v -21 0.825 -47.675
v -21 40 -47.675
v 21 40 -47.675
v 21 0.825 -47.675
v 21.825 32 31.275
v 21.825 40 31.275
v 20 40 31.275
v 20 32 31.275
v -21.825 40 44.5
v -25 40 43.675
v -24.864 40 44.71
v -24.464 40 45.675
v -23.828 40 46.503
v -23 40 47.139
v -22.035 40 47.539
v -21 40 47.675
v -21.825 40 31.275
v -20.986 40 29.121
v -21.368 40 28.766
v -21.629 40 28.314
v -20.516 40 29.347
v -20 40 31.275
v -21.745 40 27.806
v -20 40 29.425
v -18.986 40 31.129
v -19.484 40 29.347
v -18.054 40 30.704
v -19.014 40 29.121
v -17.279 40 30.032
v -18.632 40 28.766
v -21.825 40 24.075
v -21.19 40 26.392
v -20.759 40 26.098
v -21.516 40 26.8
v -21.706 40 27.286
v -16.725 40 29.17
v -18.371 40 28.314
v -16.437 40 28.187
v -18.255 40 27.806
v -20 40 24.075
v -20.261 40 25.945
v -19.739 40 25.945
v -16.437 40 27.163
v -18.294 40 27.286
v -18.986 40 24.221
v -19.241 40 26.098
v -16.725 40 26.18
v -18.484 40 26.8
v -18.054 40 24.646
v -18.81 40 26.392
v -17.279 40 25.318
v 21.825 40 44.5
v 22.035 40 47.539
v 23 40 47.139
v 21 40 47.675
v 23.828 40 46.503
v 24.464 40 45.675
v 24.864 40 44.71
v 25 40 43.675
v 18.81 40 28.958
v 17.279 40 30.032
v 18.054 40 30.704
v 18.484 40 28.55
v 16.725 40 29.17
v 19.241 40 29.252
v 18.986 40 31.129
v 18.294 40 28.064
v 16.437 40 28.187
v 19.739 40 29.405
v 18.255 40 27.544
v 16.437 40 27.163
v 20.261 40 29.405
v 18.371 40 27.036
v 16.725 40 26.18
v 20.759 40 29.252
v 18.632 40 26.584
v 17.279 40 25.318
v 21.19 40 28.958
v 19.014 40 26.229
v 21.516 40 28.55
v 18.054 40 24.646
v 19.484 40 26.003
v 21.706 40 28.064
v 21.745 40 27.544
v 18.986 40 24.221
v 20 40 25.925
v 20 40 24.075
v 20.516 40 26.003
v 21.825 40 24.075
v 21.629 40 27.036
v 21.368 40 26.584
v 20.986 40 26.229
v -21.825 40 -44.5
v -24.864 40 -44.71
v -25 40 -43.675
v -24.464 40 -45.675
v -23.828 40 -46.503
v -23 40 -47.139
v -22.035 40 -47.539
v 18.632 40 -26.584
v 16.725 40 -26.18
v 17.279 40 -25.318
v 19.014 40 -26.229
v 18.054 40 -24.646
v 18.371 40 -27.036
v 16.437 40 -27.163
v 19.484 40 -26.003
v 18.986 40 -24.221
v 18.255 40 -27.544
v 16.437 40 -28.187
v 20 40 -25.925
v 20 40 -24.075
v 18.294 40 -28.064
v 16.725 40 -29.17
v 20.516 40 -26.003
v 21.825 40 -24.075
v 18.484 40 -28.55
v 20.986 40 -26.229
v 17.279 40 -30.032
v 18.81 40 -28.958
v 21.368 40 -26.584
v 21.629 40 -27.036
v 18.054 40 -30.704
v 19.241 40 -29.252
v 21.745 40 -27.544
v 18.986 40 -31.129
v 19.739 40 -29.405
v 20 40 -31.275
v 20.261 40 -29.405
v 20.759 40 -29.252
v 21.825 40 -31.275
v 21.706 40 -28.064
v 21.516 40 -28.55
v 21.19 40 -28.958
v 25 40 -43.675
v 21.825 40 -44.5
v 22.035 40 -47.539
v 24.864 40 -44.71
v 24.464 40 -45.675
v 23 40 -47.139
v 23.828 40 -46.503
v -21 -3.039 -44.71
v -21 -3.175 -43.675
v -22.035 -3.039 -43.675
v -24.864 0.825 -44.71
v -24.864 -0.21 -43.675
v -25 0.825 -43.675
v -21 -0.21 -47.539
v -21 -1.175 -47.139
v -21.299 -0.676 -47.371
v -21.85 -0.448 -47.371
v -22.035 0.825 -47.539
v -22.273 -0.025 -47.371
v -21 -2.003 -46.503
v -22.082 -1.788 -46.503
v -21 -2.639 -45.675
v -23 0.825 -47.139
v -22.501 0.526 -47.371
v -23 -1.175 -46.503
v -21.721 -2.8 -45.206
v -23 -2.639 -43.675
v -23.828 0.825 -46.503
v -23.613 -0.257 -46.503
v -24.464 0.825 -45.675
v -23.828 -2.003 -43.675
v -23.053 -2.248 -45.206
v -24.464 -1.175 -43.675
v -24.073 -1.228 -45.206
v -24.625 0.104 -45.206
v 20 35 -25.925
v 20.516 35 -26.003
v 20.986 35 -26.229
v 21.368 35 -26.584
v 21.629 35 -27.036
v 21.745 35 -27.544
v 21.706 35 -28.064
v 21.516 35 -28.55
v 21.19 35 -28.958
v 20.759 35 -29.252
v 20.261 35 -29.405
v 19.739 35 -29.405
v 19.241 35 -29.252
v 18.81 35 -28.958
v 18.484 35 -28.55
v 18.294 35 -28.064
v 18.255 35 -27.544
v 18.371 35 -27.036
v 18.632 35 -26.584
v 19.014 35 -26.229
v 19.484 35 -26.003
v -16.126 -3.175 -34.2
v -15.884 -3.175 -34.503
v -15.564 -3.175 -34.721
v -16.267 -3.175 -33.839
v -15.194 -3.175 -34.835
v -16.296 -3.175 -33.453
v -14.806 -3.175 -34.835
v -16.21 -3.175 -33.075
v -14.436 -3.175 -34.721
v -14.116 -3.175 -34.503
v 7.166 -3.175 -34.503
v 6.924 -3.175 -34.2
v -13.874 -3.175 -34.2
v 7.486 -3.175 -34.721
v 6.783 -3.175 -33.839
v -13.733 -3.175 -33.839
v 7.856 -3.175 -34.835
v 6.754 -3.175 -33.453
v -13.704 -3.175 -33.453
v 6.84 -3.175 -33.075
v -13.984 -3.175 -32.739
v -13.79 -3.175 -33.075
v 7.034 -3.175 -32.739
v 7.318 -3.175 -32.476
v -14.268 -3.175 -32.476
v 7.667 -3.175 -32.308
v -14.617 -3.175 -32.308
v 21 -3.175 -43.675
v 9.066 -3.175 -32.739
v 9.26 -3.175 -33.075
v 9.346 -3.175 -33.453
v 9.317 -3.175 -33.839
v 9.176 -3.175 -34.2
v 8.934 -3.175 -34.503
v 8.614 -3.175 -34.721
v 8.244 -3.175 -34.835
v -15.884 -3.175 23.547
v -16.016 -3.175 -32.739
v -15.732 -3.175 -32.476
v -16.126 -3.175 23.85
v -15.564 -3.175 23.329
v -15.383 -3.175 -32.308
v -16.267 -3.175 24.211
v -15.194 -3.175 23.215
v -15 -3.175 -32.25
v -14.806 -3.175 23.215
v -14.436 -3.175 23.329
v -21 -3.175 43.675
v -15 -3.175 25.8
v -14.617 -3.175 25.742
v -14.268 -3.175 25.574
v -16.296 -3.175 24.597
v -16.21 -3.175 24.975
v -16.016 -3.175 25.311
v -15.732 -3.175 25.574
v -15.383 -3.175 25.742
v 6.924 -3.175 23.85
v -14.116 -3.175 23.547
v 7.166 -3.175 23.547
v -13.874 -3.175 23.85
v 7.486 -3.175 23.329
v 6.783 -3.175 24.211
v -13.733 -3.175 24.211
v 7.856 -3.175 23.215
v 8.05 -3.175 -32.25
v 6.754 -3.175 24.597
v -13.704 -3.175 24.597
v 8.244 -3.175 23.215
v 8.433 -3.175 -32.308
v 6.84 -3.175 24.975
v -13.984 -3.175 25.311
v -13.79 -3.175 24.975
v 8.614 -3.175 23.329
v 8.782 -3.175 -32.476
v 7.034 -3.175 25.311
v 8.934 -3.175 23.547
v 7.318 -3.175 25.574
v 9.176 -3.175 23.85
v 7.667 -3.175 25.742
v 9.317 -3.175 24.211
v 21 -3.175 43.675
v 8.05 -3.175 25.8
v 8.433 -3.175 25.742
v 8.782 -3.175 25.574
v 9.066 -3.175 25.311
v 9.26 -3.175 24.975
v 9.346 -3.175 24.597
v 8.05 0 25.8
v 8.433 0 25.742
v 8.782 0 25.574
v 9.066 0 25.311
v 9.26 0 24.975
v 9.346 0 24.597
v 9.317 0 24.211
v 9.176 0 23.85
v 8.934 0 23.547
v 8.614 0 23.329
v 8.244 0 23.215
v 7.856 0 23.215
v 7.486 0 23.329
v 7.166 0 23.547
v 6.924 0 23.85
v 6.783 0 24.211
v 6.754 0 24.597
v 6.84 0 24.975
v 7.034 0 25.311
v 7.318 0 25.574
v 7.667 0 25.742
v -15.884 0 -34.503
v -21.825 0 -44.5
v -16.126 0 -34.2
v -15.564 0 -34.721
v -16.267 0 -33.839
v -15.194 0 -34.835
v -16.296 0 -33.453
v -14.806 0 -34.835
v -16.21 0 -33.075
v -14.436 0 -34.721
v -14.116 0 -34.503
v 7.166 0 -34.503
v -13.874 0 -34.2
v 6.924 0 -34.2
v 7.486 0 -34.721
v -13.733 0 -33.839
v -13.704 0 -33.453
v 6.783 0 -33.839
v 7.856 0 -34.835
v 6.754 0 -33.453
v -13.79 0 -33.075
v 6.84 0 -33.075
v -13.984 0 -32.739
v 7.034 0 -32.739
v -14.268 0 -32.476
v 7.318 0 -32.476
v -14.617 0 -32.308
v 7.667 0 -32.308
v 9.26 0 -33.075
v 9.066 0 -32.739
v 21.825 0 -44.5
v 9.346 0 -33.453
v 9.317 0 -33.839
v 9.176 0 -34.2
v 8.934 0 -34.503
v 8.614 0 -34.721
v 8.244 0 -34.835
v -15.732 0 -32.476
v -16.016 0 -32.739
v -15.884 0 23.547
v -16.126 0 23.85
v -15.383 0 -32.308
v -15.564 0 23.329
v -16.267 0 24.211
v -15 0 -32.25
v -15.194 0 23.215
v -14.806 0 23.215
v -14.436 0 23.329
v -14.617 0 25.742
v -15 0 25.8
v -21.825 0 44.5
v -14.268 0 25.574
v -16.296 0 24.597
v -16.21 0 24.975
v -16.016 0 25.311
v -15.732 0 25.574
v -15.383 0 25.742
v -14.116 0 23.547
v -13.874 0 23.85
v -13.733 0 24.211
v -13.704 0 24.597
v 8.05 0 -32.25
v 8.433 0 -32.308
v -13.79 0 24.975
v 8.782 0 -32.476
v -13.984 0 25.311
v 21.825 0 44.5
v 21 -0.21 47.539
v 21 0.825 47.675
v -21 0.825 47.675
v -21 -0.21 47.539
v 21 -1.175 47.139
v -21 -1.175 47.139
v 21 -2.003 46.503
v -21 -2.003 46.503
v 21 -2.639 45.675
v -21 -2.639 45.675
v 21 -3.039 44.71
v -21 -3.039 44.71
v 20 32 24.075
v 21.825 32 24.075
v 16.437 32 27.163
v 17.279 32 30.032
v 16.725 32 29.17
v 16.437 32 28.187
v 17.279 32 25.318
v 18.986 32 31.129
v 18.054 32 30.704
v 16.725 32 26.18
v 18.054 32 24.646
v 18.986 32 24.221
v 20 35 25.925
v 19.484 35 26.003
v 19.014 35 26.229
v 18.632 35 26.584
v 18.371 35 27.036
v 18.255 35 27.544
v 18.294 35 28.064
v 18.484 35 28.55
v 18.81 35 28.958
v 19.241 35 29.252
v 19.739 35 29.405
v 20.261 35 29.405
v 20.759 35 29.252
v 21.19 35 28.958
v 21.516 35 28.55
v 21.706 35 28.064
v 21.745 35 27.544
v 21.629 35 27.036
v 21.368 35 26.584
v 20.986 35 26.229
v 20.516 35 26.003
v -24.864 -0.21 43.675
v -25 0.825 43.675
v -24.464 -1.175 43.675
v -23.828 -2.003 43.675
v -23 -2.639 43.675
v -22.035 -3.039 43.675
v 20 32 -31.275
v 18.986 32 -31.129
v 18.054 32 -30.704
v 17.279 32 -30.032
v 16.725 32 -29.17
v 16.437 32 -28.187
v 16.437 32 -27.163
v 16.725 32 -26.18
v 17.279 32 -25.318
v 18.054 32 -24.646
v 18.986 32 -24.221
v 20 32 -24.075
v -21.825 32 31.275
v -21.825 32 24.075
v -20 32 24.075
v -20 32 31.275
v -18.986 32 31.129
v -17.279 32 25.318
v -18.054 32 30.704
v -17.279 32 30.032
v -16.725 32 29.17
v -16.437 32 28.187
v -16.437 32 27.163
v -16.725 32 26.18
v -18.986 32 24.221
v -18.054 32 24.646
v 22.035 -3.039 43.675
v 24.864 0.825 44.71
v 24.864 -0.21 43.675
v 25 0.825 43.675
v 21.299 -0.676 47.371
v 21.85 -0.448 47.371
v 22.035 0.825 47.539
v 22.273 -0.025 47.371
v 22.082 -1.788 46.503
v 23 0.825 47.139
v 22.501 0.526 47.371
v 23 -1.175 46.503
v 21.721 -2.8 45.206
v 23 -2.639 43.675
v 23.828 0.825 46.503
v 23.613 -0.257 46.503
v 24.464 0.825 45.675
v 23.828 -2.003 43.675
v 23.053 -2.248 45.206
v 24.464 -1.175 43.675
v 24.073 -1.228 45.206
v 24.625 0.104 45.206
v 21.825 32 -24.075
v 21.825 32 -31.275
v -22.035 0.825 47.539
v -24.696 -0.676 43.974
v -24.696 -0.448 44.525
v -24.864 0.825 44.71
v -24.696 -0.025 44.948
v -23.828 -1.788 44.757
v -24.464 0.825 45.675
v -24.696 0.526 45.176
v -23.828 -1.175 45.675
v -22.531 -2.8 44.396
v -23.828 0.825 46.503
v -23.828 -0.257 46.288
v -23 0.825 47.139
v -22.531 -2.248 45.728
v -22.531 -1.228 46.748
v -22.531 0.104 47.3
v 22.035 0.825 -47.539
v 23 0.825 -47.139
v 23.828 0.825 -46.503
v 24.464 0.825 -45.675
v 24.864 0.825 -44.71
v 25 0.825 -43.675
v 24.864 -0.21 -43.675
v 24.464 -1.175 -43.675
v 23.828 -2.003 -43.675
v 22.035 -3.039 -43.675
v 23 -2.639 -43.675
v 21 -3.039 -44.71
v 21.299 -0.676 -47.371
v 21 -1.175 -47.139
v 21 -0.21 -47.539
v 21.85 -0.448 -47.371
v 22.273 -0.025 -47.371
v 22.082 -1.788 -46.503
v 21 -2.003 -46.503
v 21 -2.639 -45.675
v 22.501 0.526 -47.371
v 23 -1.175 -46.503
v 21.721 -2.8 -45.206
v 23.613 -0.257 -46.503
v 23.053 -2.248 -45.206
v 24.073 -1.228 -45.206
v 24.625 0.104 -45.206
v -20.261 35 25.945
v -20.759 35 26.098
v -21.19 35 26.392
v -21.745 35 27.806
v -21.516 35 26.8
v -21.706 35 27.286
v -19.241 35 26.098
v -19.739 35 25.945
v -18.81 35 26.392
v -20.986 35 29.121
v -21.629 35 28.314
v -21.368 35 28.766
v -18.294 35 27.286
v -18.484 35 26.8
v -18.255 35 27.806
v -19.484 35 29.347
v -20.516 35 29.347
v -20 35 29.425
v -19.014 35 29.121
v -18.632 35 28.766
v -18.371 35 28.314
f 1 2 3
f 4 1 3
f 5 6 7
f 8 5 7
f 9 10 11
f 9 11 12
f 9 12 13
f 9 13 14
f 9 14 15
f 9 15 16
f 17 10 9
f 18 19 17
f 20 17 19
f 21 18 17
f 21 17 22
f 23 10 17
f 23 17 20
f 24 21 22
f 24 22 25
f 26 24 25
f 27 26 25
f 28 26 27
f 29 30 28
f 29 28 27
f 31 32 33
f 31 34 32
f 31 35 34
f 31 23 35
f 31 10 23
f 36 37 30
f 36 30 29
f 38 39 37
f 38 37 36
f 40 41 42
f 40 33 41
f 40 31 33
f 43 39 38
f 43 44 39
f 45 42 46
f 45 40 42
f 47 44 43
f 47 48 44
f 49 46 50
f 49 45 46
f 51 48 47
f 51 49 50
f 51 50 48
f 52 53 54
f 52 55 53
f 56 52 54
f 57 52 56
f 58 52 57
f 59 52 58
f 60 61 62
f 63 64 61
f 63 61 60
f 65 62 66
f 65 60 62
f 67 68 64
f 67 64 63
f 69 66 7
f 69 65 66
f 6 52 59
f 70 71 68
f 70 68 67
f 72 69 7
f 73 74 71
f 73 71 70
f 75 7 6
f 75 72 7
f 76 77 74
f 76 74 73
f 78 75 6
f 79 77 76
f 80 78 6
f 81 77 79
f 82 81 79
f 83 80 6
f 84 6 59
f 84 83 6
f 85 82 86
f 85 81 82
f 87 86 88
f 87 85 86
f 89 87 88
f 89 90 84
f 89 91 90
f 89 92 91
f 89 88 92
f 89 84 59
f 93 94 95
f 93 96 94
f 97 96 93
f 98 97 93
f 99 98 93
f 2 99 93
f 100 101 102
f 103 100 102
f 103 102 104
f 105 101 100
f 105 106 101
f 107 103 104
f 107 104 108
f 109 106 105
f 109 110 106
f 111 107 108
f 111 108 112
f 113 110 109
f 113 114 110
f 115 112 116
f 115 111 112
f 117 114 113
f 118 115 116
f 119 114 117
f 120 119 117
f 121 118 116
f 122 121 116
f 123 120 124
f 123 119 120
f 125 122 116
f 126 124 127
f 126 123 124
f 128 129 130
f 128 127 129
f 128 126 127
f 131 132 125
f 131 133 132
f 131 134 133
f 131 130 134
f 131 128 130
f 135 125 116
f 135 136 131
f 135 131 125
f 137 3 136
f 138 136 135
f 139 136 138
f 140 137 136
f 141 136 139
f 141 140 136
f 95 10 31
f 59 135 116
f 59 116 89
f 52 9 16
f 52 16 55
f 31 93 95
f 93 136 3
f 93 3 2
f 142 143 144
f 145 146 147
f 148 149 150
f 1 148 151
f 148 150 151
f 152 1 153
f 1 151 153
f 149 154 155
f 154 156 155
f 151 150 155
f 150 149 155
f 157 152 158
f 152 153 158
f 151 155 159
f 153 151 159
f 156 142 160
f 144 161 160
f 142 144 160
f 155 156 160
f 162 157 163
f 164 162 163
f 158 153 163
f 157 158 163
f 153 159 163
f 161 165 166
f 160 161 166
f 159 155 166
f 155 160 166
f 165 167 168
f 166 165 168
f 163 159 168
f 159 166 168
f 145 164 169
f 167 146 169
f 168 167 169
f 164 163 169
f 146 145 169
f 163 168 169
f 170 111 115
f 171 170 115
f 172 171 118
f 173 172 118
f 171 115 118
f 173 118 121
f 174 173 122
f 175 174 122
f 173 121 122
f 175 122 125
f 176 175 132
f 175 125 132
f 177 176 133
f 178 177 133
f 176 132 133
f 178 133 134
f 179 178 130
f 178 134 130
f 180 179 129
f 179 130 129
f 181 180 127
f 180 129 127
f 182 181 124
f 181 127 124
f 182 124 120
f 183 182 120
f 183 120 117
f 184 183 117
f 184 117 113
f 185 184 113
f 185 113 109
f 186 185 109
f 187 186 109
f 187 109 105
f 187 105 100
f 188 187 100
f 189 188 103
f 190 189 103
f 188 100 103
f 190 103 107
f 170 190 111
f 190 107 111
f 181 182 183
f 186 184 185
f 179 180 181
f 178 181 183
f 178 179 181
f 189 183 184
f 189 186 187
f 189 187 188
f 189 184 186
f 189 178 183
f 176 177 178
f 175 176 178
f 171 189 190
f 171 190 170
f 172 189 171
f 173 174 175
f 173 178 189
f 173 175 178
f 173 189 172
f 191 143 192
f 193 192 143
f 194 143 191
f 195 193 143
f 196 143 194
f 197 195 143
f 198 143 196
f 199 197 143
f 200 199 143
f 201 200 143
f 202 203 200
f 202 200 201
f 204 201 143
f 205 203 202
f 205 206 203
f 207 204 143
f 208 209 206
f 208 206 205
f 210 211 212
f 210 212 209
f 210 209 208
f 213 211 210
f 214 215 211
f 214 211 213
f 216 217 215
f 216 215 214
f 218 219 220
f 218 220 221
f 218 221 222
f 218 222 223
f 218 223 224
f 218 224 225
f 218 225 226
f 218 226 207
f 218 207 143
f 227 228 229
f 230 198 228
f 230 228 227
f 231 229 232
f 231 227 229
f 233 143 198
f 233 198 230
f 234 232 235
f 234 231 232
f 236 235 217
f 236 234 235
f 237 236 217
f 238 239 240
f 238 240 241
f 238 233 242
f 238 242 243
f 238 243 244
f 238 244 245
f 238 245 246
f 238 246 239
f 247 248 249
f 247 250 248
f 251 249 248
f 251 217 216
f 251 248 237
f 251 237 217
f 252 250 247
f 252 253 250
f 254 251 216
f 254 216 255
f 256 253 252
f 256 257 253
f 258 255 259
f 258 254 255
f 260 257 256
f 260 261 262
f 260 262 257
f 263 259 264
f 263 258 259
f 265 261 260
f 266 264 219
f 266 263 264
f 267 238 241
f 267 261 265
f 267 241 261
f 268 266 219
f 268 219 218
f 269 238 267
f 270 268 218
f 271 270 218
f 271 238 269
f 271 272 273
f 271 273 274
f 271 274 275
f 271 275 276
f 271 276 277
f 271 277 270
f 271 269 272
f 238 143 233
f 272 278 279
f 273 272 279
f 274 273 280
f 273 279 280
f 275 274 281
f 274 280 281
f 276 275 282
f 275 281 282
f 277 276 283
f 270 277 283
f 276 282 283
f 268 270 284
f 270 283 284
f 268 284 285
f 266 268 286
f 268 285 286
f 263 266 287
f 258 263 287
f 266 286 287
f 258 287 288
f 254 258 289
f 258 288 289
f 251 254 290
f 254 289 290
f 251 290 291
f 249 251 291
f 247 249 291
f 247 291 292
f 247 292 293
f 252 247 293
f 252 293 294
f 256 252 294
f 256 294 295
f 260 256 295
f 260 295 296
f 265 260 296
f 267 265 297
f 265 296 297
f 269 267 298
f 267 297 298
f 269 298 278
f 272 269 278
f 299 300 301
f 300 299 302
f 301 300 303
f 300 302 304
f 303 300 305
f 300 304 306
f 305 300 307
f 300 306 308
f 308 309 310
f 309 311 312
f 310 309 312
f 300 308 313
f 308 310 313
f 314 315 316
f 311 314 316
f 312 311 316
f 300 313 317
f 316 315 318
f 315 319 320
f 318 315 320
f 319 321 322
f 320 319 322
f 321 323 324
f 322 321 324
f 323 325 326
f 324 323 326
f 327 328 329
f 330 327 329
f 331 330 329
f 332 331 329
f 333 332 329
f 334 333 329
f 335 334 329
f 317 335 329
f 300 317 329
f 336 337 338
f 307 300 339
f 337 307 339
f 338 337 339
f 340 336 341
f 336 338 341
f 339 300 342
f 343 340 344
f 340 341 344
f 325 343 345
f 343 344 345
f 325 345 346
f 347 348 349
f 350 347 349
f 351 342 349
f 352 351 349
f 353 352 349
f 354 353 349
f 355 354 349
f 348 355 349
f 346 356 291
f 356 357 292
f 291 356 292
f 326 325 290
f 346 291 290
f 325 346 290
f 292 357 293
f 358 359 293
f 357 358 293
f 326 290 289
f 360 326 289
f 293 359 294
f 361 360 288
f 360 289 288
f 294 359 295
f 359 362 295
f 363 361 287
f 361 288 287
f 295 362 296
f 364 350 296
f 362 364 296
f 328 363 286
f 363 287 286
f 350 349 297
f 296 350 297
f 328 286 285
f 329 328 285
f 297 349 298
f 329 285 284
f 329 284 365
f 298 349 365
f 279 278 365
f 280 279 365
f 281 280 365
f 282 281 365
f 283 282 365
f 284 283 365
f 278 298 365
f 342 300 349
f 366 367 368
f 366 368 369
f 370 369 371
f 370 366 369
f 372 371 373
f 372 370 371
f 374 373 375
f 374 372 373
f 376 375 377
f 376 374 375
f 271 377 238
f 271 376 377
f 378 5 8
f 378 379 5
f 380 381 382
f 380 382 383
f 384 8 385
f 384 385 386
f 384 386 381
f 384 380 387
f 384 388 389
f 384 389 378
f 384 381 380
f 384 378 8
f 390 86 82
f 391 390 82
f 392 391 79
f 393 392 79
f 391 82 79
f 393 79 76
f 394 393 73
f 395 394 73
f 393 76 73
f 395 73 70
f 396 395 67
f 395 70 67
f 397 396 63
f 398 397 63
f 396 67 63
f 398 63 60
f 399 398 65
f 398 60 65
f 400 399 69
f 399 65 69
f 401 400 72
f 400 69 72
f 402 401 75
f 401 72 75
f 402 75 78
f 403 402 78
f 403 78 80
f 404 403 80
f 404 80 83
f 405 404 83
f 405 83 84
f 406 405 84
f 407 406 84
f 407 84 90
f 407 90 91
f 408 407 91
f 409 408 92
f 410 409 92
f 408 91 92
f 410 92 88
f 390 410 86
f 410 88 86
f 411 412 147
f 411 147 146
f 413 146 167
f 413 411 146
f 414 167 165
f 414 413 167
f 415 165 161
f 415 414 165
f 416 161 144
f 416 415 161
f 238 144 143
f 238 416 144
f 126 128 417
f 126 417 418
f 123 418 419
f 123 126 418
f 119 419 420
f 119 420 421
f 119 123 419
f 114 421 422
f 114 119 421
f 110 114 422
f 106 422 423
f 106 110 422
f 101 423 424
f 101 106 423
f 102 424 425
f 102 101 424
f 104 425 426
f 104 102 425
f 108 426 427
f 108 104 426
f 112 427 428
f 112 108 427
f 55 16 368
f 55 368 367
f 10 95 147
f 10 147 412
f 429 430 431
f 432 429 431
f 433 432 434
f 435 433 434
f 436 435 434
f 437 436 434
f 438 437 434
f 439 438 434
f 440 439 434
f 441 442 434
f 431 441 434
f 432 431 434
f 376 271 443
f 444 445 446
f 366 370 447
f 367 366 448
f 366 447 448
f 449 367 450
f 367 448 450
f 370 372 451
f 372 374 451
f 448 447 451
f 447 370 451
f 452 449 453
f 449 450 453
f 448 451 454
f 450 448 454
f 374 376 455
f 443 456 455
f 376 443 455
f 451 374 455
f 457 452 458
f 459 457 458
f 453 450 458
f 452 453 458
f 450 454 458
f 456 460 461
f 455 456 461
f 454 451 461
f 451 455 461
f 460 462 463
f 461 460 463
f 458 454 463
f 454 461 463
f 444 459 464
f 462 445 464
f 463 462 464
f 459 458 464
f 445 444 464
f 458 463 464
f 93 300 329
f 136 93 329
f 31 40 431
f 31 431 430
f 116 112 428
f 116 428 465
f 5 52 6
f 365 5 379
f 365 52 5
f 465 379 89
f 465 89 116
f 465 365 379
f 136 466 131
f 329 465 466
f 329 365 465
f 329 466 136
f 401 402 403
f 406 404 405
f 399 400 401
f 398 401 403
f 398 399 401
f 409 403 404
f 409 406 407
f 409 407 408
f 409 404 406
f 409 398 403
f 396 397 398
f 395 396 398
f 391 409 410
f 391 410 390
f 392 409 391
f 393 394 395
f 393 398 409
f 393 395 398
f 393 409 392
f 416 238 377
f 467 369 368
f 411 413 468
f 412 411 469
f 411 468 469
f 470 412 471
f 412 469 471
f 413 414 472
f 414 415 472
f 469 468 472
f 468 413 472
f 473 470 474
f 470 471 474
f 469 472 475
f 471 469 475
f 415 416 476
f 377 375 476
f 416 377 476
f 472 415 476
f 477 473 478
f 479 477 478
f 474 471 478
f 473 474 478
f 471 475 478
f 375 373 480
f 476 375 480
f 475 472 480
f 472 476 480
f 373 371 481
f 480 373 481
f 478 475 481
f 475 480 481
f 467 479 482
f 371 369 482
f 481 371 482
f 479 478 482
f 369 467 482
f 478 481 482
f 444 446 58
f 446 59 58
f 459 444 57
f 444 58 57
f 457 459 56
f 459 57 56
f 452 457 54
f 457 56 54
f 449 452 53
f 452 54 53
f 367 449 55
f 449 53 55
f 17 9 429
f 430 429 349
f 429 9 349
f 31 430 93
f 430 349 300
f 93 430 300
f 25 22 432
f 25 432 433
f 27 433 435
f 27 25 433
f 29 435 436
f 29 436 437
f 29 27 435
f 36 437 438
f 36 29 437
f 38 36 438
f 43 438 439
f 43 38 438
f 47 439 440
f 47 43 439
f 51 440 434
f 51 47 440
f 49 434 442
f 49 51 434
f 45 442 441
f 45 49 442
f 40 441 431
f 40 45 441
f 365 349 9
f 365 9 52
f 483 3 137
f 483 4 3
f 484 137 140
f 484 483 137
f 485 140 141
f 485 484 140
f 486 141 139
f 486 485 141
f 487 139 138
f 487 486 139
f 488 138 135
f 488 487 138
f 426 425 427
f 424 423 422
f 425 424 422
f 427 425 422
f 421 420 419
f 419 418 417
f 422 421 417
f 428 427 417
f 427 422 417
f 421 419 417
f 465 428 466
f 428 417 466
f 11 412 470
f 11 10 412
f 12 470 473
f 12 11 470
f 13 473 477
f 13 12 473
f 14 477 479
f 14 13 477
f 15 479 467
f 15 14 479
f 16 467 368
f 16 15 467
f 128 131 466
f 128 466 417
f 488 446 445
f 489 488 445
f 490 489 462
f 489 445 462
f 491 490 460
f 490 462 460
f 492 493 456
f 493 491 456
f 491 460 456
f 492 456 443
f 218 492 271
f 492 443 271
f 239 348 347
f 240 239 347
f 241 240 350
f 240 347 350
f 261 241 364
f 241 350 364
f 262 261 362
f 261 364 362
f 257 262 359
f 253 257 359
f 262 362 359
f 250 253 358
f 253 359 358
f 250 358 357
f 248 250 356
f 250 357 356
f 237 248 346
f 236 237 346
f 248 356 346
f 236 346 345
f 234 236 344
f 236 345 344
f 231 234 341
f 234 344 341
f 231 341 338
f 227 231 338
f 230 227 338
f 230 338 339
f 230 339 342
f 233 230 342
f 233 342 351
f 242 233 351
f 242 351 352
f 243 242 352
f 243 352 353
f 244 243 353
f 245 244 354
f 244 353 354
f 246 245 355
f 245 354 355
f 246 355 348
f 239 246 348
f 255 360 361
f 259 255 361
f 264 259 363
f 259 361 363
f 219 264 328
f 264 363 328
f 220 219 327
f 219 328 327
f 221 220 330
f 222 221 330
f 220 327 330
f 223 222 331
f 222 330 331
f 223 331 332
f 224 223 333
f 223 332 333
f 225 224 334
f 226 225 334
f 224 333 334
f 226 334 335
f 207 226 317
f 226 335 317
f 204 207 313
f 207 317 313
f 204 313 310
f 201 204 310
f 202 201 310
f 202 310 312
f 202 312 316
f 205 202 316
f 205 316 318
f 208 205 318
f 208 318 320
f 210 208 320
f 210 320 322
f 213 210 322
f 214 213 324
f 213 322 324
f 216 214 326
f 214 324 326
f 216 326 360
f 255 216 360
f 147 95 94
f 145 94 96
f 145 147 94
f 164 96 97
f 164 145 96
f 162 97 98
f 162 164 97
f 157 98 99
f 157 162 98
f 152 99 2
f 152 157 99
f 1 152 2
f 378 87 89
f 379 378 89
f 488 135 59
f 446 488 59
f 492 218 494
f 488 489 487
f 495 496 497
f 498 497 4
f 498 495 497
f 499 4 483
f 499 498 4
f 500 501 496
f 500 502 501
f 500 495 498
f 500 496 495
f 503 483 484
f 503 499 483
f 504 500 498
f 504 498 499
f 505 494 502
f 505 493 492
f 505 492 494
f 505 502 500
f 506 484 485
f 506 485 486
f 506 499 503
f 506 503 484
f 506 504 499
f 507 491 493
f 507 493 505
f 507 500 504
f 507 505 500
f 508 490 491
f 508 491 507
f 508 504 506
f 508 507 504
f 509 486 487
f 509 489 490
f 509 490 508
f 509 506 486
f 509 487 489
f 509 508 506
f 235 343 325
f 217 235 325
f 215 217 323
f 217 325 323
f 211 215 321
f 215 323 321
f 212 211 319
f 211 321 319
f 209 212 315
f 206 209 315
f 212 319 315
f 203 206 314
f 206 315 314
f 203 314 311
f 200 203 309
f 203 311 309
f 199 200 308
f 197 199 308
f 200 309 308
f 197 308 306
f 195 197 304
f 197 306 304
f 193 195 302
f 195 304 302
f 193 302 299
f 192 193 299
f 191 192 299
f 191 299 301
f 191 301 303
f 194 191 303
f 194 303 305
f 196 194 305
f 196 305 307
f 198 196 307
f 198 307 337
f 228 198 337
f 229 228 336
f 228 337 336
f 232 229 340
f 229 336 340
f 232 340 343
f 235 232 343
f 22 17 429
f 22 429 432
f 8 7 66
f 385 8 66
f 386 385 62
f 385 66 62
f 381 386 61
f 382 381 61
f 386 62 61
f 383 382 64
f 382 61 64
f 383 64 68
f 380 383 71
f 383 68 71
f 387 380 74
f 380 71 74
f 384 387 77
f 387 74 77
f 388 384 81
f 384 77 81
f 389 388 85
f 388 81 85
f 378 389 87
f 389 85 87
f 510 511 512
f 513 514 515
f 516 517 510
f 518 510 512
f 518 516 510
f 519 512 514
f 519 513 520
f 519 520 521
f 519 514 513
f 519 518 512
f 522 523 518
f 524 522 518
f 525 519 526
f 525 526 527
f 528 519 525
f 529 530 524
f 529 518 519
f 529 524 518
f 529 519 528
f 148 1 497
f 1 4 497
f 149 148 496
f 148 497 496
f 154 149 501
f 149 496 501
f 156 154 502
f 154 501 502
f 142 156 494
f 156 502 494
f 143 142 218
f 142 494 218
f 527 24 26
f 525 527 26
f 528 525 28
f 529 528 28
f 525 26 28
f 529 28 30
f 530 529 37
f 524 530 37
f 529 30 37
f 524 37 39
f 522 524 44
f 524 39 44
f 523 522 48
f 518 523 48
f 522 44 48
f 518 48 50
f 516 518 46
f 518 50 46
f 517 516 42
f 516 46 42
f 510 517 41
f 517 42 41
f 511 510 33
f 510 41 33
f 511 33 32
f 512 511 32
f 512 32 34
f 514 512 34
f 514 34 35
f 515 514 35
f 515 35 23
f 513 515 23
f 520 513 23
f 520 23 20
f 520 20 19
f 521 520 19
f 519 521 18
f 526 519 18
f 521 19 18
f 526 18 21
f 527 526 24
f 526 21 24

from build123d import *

# Parameters (mm, degrees)
SKETCH1_W           = 50
SKETCH1_H           = 95.35
SKETCH1_W_2         = 43.65
SKETCH1_H_2         = 89
BOSS_EXTRUDE1_DEPTH = 40
SKETCH2_W           = 50
SKETCH2_H           = 95.35
BOSS_EXTRUDE2_DEPTH = 3.175
FILLET1_R           = 4
SKETCH3_R           = 1.3
CUT_EXTRUDE1_DEPTH  = 3.175
BOSS_EXTRUDE3_DEPTH = 8
SKETCH5_R           = 1.75
CUT_EXTRUDE2_DEPTH  = 5


with BuildPart() as part:
    # Sketch1 → Boss-Extrude1 (new body)
    with BuildSketch(Plane(origin=(0, 0, 0), x_dir=(1, 0, 0), z_dir=(0, 1, 0))):
        Rectangle(SKETCH1_W, SKETCH1_H)
        Rectangle(SKETCH1_W_2, SKETCH1_H_2, mode=Mode.SUBTRACT)
    extrude(amount=BOSS_EXTRUDE1_DEPTH)

    # Sketch2 → Boss-Extrude2 (add)
    with BuildSketch(Plane.XZ):
        Rectangle(SKETCH2_W, SKETCH2_H)
    extrude(amount=BOSS_EXTRUDE2_DEPTH)

    # Fillet1
    fillet1_edges = [part.edges().sort_by_distance(p)[0] for p in [
        (25, -3.175, 0),
        (0, -3.175, 47.675),
        (-25, -3.175, 0),
        (0, -3.175, -47.675),
        (25, 18.4125, 47.675),
        (-25, 18.4125, 47.675),
        (-25, 18.4125, -47.675),
        (25, 18.4125, -47.675),
    ]]
    fillet(fillet1_edges, radius=FILLET1_R)

    # Sketch3 → Cut-Extrude1 (cut)
    with BuildSketch(Plane(origin=(0, 0, 0), x_dir=(1, 0, 0), z_dir=(0, 1, 0))):
        with Locations(Location((-15, 33.55, 0), (0, 0, 270))):
            Circle(SKETCH3_R)
        with Locations(Location((8.05, 33.55, 0), (0, 0, 270))):
            Circle(SKETCH3_R)
        with Locations(Location((8.05, -24.5, 0), (0, 0, 270))):
            Circle(SKETCH3_R)
        with Locations(Location((-15, -24.5, 0), (0, 0, 270))):
            Circle(SKETCH3_R)
    extrude(amount=-CUT_EXTRUDE1_DEPTH, mode=Mode.SUBTRACT)

    # Sketch4 → Boss-Extrude3 (add)
    with BuildSketch(Plane(origin=(0, 40, 0), x_dir=(1, 0, 0), z_dir=(0, 1, 0))):
        with BuildLine():
            Line((-20, -24.075), (-21.825, -24.075))
            Line((-21.825, -24.075), (-21.825, -31.275))
            Line((-21.825, -31.275), (-20, -31.275))
            ThreePointArc((-20, -31.275), (-16.4, -27.675), (-20, -24.075))
        make_face()
        with BuildLine():
            Line((21.825, -31.275), (20, -31.275))
            ThreePointArc((20, -31.275), (16.4, -27.675), (20, -24.075))
            Line((20, -24.075), (21.825, -24.075))
            Line((21.825, -24.075), (21.825, -31.275))
        make_face()
        with BuildLine():
            Line((20, 24.075), (21.825, 24.075))
            Line((21.825, 24.075), (21.825, 31.275))
            Line((21.825, 31.275), (20, 31.275))
            ThreePointArc((20, 31.275), (16.4, 27.675), (20, 24.075))
        make_face()
    extrude(amount=-BOSS_EXTRUDE3_DEPTH)

    # Sketch5 → Cut-Extrude2 (cut)
    with BuildSketch(Plane(origin=(0, 40, 0), x_dir=(1, 0, 0), z_dir=(0, 1, 0))):
        with Locations(Location((-20, -27.675, 0), (0, 0, 270))):
            Circle(SKETCH5_R)
        with Locations(Location((20, -27.675, 0), (0, 0, 90))):
            Circle(SKETCH5_R)
        with Locations(Location((20, 27.675, 0), (0, 0, 270))):
            Circle(SKETCH5_R)
    extrude(amount=-CUT_EXTRUDE2_DEPTH, mode=Mode.SUBTRACT)


solid = part.part
